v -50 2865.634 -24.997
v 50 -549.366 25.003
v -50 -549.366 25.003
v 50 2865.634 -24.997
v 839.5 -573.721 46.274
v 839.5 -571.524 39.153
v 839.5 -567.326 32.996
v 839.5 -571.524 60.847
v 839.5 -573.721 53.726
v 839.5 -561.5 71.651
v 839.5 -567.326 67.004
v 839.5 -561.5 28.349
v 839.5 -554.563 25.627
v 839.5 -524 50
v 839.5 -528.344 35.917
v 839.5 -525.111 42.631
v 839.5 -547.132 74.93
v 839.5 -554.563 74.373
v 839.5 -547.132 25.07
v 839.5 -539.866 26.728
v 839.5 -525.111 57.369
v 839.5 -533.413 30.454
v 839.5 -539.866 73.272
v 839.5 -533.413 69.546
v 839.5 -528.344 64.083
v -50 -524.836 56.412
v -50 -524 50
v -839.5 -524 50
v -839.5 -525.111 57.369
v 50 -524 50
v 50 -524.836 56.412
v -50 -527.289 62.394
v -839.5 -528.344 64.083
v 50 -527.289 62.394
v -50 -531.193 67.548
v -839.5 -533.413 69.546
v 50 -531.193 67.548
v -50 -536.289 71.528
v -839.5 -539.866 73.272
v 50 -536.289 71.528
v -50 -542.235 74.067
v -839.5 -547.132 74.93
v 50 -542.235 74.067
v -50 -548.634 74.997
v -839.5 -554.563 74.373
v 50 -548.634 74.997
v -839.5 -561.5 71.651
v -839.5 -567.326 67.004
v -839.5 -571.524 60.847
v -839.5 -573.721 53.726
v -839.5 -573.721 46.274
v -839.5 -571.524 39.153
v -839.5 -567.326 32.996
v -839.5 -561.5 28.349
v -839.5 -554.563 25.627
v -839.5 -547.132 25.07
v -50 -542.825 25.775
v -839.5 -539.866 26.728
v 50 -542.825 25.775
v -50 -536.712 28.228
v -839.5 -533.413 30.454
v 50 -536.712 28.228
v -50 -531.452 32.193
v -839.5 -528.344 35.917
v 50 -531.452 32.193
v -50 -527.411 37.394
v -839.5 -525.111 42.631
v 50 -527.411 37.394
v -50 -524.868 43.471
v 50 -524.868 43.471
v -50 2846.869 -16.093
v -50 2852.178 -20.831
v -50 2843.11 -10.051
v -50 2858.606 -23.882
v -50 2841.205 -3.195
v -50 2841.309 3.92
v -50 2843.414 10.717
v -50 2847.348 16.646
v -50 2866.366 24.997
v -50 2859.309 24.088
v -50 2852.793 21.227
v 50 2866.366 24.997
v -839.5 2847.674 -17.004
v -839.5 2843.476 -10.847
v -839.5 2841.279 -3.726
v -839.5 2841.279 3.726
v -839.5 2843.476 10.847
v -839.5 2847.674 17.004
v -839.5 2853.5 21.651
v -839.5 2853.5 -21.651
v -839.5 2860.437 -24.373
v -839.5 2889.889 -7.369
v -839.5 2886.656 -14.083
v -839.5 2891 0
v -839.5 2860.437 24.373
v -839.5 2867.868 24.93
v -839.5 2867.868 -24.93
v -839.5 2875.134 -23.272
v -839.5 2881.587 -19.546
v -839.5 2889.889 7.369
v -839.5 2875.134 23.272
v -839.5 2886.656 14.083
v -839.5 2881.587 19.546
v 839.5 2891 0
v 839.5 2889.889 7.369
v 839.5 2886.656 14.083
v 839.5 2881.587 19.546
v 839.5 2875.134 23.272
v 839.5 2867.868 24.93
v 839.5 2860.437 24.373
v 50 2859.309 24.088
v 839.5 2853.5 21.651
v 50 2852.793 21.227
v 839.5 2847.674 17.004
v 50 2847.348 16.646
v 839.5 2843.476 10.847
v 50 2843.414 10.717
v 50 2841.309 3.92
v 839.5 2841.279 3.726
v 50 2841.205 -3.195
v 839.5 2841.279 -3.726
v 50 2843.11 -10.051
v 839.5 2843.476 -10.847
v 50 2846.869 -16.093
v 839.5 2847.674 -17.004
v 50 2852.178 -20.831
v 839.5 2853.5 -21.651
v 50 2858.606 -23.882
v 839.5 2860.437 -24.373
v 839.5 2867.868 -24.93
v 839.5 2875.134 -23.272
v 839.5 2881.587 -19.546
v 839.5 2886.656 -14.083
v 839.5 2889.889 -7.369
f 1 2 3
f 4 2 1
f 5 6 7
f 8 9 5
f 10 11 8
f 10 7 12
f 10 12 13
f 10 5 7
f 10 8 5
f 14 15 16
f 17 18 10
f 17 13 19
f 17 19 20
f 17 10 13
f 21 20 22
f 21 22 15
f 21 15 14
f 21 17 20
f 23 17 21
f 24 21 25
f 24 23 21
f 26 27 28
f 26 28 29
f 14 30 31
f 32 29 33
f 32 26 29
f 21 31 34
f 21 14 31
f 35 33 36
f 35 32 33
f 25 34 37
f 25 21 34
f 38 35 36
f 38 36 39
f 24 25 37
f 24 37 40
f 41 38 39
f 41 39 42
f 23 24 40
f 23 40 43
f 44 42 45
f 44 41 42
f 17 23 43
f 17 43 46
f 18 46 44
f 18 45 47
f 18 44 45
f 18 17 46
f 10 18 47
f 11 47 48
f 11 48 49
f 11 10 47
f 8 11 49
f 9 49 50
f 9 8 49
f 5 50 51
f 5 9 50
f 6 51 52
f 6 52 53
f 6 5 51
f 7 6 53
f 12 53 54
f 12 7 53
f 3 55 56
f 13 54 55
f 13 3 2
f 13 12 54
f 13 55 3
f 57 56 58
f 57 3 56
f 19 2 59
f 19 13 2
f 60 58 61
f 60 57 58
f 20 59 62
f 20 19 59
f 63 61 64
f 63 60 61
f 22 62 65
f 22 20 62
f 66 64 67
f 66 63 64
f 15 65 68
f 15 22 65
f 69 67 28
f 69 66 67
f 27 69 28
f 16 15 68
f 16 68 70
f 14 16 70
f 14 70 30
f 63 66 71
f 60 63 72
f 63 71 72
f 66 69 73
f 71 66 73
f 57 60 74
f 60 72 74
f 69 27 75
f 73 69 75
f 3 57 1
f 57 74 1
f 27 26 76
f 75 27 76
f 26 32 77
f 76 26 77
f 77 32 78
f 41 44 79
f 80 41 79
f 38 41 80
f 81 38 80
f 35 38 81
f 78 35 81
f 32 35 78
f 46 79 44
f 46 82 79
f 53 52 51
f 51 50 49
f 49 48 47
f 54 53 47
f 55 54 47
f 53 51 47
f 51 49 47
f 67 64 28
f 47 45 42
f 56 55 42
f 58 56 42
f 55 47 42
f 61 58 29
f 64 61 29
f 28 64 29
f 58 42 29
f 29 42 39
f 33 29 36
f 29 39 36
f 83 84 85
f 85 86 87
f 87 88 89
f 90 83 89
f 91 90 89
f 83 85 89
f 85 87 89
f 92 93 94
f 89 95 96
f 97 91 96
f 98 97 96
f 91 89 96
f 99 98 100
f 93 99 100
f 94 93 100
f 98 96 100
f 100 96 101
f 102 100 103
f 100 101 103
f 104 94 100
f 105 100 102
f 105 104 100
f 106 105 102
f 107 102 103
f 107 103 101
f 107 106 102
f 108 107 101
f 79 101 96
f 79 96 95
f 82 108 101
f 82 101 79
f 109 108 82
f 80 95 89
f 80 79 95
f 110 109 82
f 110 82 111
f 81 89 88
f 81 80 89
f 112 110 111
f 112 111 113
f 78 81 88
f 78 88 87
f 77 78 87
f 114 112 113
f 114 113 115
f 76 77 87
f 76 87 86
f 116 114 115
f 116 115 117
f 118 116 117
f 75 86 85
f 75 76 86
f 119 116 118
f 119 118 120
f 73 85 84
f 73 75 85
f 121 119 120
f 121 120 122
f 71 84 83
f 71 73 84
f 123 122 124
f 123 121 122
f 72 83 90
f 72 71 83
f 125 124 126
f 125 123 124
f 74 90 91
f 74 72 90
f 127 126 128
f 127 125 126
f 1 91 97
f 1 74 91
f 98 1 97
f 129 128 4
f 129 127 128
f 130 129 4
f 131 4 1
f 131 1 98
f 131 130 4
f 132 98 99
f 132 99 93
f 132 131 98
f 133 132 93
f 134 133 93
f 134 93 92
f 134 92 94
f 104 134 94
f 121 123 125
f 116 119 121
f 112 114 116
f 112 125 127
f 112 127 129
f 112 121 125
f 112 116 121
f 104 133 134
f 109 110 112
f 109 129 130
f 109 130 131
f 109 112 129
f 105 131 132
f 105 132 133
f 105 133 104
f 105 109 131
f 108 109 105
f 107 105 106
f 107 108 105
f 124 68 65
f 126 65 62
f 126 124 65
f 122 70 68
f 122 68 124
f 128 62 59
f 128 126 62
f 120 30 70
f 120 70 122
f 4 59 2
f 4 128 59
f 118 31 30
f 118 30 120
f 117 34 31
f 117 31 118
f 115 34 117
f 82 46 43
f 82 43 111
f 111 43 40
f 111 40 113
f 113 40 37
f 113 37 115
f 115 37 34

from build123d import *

# Parameters (mm, degrees)
F2_R     = 25
F3_DEPTH = 1679
F5_DEPTH = 50


with BuildPart() as f3:
    # F2 (on plane+point) → F3 (new body, through all)
    with BuildSketch(Plane.YZ.offset(839.5)):
        with Locations((-549, 50)):
            Circle(F2_R)
    extrude(amount=-F3_DEPTH)



with BuildPart() as f3b:
    # F2 (on plane+point) → F3, piece 2 (new body, through all)
    with BuildSketch(Plane.YZ.offset(839.5)):
        with Locations((2866, 0)):
            Circle(F2_R)
    extrude(amount=-F3_DEPTH)


with BuildPart() as f3_1:
    add(f3.part)

    add(f3b.part)  # F5 merges F3b
    # F4 (on Right) → F5 (join, symmetric)
    with BuildSketch(Plane.YZ):
        with BuildLine():
            Line((2866.3659929845, 24.9973208391), (-548.6340070155, 74.9973208391))
            ThreePointArc((-548.6340070155, 74.9973208391), (-573.9973208391, 50.3659929845), (-549.3659929845, 25.0026791609))
            Line((-549.3659929845, 25.0026791609), (2865.6340070155, -24.9973208391))
            ThreePointArc((2865.6340070155, -24.9973208391), (2890.9973208391, -0.3659929845), (2866.3659929845, 24.9973208391))
        make_face()
    extrude(amount=F5_DEPTH, both=True)


solid = f3_1.part
